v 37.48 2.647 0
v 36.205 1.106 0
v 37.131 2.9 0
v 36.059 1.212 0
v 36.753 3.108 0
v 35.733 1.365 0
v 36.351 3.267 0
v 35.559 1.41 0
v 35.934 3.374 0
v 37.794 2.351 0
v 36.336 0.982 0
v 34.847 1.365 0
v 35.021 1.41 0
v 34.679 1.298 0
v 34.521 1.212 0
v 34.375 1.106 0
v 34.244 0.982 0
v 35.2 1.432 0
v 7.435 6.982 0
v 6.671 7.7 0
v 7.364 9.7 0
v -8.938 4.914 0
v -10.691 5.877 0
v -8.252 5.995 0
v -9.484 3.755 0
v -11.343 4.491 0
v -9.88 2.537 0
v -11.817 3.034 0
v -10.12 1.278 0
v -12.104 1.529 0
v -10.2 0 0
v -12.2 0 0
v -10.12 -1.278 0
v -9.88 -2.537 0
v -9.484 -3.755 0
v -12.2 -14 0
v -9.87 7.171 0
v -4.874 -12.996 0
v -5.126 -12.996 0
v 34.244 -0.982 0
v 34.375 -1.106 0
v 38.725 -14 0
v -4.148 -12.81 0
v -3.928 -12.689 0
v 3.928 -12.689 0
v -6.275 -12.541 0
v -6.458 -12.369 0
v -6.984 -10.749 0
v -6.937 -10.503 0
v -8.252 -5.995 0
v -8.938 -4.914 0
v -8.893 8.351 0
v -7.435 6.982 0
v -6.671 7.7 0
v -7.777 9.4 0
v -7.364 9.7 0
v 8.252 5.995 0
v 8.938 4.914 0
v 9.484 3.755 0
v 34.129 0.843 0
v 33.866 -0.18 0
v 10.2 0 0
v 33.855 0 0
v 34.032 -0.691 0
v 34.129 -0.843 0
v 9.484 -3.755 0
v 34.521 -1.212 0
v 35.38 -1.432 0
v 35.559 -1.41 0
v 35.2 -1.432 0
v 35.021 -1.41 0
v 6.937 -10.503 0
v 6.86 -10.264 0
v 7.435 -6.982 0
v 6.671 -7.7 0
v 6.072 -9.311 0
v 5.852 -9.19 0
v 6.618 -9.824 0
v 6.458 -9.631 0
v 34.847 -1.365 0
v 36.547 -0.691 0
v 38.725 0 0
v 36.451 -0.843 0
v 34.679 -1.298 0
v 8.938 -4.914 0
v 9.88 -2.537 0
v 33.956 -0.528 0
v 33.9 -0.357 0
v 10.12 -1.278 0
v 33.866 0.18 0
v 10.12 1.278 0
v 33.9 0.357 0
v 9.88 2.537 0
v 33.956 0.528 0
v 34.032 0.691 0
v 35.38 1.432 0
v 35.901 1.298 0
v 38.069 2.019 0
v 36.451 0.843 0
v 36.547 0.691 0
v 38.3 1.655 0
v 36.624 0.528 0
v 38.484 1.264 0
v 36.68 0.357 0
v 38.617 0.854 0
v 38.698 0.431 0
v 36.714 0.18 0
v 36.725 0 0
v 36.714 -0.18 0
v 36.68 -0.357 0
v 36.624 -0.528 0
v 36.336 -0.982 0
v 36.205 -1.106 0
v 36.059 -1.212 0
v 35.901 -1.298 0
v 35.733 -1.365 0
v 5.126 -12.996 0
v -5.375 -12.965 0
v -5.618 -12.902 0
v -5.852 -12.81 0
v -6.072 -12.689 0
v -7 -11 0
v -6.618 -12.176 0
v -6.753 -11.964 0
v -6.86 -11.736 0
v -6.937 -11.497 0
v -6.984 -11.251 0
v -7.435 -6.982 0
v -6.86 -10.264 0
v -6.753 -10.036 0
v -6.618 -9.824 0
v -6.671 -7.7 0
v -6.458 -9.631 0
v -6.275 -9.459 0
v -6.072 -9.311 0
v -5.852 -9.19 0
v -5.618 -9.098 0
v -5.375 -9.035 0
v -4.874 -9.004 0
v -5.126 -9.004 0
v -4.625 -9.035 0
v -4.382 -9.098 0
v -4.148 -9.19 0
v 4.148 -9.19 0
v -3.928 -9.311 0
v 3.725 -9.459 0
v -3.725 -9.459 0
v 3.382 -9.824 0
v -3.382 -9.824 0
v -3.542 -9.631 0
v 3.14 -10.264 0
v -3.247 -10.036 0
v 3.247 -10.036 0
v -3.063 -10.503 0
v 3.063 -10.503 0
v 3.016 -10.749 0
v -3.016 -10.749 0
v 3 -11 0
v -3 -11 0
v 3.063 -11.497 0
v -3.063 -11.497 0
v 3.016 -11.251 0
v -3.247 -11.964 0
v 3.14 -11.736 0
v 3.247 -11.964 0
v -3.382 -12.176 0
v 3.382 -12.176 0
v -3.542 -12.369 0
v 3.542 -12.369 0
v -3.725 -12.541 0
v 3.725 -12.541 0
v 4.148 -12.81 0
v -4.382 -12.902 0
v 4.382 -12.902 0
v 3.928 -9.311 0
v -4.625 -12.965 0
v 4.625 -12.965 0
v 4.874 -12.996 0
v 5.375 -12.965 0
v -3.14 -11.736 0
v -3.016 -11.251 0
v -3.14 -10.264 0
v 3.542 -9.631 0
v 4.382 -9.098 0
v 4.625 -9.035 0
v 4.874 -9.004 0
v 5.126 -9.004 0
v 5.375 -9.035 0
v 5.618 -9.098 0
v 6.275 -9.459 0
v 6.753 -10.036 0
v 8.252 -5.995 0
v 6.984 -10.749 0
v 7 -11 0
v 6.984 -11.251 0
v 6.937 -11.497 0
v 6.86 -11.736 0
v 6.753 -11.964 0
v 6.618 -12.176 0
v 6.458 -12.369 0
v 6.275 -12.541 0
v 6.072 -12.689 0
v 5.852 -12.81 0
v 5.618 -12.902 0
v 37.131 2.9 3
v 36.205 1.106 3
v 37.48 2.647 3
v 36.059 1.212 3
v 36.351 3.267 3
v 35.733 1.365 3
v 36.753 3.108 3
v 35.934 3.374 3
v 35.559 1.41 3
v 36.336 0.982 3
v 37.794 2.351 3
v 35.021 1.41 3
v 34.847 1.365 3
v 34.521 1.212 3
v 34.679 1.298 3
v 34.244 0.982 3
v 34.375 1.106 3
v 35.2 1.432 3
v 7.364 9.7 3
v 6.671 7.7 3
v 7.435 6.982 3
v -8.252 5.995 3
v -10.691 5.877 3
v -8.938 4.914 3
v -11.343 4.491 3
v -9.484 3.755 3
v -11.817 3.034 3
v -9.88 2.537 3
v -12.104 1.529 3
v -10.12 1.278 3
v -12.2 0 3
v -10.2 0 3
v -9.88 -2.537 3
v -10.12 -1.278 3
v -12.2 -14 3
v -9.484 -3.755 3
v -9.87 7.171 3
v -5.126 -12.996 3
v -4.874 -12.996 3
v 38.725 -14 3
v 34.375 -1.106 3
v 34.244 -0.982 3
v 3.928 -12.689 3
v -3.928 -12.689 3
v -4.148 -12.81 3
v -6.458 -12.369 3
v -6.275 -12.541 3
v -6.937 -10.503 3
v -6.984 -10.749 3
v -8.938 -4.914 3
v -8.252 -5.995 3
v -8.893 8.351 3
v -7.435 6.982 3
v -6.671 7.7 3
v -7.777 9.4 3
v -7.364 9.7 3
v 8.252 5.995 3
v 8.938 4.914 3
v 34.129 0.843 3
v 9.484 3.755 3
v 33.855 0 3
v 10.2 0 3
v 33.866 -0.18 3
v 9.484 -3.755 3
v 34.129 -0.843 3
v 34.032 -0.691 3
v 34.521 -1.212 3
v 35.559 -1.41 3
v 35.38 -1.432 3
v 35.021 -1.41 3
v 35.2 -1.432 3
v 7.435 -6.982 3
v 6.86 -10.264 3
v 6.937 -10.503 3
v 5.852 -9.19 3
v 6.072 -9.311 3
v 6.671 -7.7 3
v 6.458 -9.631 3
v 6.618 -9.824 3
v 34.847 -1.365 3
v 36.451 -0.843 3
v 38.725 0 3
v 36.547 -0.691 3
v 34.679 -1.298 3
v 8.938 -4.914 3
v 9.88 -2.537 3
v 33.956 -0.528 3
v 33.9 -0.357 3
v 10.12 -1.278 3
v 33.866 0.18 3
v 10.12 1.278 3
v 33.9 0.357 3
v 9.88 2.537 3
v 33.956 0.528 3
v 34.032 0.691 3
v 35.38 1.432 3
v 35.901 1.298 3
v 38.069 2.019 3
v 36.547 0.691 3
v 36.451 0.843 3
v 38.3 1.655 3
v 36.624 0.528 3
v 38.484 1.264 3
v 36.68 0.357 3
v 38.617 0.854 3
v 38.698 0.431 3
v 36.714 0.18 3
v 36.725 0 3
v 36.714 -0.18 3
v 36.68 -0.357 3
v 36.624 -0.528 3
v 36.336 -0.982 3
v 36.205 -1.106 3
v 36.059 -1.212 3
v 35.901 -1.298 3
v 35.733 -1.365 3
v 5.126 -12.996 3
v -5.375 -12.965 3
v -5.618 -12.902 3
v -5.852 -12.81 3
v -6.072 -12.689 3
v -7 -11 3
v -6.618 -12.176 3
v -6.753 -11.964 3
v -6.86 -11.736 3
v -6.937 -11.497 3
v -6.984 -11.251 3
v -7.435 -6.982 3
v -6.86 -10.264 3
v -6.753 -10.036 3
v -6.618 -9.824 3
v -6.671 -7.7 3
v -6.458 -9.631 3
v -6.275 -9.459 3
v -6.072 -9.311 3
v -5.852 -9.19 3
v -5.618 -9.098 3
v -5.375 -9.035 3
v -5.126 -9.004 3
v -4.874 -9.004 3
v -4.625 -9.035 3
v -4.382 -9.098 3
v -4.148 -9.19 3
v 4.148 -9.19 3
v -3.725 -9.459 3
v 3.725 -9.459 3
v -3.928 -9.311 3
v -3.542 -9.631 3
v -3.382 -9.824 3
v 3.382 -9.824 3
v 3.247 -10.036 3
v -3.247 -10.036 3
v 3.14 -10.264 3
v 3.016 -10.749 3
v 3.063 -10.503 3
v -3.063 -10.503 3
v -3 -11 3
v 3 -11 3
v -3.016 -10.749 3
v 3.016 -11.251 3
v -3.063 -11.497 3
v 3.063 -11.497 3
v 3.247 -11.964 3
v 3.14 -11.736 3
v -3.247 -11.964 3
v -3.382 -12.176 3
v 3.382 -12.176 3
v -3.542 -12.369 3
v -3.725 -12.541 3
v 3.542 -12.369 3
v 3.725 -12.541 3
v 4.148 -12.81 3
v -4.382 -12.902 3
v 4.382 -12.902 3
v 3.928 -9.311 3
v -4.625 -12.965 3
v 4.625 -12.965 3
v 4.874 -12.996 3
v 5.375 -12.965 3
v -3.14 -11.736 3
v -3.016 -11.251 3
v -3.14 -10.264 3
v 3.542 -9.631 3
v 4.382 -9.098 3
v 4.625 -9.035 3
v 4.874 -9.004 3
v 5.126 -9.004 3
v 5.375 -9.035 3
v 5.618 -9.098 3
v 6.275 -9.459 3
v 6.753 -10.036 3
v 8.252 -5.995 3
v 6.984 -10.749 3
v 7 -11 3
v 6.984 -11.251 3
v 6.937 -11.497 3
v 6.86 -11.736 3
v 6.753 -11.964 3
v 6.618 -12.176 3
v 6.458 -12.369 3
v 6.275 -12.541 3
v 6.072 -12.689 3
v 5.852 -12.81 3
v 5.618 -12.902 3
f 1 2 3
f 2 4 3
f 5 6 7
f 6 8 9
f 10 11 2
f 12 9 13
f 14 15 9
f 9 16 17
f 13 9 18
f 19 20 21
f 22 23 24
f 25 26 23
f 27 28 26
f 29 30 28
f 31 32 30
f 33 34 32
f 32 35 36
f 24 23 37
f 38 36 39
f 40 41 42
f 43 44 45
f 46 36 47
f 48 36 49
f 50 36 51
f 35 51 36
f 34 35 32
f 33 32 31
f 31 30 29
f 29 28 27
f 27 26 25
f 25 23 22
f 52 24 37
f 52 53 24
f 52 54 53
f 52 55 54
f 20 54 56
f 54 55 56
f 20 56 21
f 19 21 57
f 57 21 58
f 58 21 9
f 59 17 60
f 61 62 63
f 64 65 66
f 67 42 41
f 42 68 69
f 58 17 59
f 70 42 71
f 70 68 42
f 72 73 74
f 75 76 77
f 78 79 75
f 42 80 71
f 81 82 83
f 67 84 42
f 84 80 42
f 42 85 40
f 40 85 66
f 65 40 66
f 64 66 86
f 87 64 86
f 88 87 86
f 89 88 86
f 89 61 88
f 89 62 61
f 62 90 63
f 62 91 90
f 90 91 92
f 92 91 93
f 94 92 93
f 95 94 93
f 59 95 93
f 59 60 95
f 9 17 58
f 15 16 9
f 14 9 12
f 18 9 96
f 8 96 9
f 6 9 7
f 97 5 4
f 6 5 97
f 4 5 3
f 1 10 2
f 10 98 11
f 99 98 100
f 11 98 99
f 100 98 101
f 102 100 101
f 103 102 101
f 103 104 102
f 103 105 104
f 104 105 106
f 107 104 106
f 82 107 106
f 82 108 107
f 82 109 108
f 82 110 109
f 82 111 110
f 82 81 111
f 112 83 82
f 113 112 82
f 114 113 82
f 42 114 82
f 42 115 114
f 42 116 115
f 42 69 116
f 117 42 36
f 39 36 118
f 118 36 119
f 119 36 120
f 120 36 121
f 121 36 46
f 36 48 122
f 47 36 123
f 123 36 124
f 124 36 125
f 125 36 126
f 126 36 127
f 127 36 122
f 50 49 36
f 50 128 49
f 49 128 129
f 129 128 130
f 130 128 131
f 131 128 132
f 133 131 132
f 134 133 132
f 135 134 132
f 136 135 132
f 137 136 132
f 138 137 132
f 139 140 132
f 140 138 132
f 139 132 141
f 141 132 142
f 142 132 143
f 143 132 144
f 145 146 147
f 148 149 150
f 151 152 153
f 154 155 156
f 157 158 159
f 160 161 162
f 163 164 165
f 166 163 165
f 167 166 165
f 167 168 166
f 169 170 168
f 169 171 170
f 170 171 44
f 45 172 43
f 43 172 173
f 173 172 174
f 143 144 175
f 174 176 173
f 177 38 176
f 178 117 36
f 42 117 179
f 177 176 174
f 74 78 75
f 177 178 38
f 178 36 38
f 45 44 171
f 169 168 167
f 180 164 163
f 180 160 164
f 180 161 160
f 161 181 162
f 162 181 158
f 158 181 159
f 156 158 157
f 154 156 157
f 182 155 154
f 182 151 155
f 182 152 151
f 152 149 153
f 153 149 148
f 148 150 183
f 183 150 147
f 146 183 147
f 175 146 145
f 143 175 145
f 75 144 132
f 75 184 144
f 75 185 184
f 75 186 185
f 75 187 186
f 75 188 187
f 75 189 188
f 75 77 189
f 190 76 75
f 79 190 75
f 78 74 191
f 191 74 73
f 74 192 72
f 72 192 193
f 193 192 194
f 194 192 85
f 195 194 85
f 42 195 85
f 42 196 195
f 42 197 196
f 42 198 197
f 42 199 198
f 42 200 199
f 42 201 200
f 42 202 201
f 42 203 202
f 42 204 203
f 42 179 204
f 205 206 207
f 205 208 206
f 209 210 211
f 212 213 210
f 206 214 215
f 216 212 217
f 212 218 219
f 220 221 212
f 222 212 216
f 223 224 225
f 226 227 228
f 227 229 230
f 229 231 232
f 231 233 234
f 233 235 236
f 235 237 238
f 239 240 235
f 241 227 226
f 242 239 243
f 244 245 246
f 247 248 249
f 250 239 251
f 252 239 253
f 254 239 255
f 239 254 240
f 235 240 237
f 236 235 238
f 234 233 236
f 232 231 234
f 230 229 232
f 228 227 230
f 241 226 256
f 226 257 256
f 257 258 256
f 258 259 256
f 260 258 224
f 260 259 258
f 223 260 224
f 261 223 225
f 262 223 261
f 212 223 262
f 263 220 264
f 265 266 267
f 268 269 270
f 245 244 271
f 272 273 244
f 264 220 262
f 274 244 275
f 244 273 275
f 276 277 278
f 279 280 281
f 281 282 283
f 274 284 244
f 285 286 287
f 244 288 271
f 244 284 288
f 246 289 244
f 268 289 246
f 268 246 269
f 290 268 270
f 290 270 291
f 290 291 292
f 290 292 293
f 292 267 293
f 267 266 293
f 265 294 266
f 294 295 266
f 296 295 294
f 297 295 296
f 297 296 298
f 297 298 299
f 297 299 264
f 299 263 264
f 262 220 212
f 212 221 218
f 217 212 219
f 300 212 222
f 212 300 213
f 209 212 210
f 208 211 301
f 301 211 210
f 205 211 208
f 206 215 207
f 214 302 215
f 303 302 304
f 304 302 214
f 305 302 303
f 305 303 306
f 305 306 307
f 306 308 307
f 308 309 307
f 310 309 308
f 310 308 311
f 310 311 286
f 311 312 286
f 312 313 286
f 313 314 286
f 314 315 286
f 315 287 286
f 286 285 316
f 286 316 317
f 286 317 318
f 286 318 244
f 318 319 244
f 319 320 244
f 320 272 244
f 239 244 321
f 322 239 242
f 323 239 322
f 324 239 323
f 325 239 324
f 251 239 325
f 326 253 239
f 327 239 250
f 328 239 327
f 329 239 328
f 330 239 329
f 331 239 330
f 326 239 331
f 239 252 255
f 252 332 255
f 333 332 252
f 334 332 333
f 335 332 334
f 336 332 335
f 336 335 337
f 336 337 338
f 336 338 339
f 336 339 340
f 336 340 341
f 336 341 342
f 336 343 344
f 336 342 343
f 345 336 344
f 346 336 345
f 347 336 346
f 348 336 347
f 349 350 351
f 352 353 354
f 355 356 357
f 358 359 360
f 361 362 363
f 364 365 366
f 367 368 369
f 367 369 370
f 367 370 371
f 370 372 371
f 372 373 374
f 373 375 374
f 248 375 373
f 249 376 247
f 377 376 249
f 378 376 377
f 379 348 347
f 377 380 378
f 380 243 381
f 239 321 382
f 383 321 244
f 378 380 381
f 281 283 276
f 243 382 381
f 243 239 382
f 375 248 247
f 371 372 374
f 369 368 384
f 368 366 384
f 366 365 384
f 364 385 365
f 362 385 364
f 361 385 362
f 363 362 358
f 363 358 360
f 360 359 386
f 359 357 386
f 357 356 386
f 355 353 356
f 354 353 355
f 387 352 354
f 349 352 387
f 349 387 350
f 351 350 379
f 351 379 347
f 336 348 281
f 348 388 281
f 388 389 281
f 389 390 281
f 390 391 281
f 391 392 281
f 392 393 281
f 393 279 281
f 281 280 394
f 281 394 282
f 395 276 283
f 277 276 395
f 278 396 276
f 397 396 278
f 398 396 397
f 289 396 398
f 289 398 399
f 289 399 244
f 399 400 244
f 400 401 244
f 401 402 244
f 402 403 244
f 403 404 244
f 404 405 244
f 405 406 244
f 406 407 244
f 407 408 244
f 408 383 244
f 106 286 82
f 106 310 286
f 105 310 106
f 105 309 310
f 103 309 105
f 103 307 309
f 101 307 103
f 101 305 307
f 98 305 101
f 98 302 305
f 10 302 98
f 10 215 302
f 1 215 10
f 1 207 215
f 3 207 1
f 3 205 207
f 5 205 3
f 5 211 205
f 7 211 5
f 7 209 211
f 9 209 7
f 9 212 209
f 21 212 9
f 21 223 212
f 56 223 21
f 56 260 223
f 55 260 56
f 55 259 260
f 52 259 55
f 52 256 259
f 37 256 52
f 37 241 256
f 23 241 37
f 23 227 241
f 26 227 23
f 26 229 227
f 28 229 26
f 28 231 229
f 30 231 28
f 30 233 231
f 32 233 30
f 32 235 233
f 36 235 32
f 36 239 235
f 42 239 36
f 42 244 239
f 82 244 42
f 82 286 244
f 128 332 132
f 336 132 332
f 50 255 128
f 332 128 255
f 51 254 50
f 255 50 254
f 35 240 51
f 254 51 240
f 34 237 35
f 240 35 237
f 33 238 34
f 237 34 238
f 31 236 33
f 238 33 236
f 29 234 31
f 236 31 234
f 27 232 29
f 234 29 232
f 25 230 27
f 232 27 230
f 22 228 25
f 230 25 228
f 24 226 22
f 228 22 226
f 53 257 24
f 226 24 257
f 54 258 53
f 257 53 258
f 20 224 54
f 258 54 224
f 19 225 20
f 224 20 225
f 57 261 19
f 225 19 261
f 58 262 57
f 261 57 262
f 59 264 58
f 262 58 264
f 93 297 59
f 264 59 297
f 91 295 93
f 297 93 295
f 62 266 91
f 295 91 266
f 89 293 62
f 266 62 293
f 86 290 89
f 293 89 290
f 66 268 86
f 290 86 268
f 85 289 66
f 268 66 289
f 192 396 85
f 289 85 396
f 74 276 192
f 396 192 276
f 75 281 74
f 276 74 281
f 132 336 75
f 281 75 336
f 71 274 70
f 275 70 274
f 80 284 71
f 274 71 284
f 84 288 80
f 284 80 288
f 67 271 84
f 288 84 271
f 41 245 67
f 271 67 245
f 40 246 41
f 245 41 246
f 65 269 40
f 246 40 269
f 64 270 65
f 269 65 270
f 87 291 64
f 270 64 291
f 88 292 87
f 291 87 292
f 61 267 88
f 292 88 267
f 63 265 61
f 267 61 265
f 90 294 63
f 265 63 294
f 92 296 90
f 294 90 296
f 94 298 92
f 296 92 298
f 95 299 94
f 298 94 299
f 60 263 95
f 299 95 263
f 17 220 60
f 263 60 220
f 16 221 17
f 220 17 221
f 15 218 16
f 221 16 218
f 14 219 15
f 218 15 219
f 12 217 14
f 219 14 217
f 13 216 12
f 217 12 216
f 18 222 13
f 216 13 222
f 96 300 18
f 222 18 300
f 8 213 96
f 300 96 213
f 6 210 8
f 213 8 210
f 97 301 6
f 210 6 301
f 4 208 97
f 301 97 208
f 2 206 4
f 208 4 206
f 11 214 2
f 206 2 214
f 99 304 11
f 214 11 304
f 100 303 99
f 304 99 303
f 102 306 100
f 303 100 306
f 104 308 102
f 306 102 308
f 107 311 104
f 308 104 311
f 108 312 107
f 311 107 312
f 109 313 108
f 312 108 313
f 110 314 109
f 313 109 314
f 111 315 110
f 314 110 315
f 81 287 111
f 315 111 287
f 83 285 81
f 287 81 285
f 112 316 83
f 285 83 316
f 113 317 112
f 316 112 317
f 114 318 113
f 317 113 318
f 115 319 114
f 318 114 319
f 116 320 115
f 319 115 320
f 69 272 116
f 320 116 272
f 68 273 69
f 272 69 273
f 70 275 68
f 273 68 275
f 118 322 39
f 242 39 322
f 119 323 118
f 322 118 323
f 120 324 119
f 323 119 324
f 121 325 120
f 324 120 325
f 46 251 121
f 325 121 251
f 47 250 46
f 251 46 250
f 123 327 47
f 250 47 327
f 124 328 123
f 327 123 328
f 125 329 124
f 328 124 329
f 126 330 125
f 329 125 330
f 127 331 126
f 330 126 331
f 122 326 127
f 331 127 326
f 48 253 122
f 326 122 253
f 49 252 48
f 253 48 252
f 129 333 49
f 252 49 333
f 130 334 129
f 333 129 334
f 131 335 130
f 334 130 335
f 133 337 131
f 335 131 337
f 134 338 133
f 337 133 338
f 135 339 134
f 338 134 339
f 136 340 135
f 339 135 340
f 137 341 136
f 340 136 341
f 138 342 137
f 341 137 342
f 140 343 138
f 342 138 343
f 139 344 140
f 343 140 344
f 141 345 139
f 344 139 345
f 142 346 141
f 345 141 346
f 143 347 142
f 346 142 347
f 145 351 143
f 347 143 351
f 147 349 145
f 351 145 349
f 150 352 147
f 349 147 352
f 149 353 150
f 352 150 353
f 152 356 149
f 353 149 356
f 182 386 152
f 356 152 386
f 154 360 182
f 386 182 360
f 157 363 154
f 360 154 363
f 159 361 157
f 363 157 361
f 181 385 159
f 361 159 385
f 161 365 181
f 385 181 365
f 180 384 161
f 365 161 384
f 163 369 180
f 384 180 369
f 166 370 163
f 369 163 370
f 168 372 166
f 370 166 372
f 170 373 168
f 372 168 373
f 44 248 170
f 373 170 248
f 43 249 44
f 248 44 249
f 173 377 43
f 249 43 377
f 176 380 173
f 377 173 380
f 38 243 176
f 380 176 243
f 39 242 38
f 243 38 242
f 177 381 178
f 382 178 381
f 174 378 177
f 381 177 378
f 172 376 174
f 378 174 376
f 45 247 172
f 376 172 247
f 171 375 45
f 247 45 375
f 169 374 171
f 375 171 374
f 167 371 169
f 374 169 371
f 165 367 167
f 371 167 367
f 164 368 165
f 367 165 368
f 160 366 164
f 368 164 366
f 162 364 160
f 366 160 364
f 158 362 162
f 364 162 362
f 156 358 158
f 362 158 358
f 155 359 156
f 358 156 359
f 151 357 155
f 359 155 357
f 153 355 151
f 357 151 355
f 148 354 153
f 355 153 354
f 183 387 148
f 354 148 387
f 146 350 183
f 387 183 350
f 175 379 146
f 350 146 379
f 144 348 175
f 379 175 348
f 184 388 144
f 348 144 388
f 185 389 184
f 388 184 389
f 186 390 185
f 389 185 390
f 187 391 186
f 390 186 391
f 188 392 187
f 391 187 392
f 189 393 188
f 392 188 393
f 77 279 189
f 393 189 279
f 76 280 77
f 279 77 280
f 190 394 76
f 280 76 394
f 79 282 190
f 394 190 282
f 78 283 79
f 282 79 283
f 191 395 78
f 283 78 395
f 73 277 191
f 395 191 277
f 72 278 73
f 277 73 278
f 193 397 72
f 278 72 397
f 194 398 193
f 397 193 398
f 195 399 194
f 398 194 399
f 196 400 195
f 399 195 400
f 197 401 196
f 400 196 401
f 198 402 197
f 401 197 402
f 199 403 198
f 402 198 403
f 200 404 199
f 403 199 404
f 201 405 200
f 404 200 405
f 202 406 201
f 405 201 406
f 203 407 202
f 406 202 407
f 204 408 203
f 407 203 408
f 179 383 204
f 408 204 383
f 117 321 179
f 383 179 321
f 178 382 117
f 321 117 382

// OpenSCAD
$fn = 50;

//add ~0.5mm factor to hole diameters for 3d printing
r_motor = (0.4+20)/2; //radius of circular part
flat_part = (0.4+15)/2; //center to flat line distance
r_nail = (2.37+.5)/2; //original, 3.4mm

border = 2;
thickness = 3; //How thick you want the linear extrude of this part
//NOTE THIS SEEMS GOOD, PRINT A GOOD PAIR AND TEST
gear_distance = 1.5+36-2.44/2-1.98/2;
padding = 14; //controls how much material you want on the bottom (under motor) needs to be adjusted so it is flat bottom at padding=0

rect1 = gear_distance + r_nail + border;

module motorshape () {
	intersection() {
		polygon([[-100,-flat_part],[100,-flat_part],[100,flat_part],[-100,flat_part]]);
		circle(r_motor);
	}
}

module motorshapeborder () {
	intersection() {
		polygon([[-100,-(flat_part+border)],[100,-(flat_part+border)],[100,(flat_part+border)],[-100,(flat_part+border)]]);
		circle(r_motor+border);
	}
}

module innerholes () {
	motorshape();
	translate([gear_distance,0,0]) {circle(r_nail);}
	translate([-5,-11,0]) {circle(2);}
	translate([5,-11,0]) {circle(2);}
}

module mainbody() {
	linear_extrude(height=thickness) {
		difference() {
			hull() {
				union () {
					motorshapeborder();
					translate([gear_distance,0,0]) { circle(r_nail+border); }
					polygon([[-(r_motor+border),-padding],[-(r_motor+border),0],[rect1,0],[rect1,-padding]]);
				}
			}
			innerholes();	
		}
	}
}


mainbody();
